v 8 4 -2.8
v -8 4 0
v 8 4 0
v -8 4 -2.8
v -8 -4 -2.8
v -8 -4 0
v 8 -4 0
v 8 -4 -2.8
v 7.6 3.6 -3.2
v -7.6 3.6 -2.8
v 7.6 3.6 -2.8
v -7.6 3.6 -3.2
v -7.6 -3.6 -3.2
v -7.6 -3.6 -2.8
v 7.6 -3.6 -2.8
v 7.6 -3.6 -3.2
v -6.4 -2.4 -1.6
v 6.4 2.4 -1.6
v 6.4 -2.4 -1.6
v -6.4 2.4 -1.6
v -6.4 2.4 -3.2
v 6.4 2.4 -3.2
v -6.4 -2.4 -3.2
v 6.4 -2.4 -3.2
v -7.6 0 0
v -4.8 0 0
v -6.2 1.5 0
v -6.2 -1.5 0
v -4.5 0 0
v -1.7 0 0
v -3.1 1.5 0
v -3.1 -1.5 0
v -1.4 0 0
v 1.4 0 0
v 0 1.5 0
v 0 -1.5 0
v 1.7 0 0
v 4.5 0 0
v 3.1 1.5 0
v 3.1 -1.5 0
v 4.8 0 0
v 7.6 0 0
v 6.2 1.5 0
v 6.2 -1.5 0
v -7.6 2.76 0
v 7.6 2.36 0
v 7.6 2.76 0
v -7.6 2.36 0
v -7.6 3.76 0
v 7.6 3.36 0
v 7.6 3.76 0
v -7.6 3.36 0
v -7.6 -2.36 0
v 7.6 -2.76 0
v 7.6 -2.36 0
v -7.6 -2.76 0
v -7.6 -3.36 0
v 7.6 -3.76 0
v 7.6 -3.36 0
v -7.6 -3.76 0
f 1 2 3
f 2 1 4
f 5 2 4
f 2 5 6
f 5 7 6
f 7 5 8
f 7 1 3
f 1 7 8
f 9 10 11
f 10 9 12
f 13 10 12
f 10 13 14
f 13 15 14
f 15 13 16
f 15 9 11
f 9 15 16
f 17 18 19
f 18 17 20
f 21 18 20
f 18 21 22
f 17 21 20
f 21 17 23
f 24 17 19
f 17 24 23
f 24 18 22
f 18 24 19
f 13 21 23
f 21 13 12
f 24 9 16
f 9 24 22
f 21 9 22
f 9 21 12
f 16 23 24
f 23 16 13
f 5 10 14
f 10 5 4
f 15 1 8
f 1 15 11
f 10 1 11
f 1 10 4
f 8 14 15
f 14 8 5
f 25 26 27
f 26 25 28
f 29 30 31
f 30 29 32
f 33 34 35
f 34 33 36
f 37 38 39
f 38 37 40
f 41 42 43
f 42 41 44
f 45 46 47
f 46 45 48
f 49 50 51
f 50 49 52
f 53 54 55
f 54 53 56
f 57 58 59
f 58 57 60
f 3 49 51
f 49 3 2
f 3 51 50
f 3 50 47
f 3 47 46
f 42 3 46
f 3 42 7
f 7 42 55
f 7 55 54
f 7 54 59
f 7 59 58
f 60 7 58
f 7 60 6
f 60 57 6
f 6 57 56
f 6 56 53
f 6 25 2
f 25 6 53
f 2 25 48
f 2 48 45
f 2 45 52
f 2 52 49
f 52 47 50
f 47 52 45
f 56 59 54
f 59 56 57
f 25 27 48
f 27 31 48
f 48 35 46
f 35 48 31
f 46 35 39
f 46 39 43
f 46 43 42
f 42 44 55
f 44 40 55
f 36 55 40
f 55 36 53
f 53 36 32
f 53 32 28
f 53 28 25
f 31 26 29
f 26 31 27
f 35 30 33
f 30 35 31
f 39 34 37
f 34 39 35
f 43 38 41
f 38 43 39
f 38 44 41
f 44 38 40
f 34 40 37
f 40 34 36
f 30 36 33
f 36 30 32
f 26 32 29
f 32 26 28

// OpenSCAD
// file: ../p/box5.scad
use <../lib.scad>
function ldraw_lib__box5() = [
// 0 Box with 5 Faces and All Edges
// 0 Name: box5.dat
// 0 Author: James Jessiman
// 0 !LDRAW_ORG Primitive UPDATE 2012-01
// 0 !LICENSE Licensed under CC BY 4.0 : see CAreadme.txt
// 
// 0 BFC CERTIFY CCW
  [0,"BFC","CERTIFY"],
  [0,"BFC","CCW"],
// 
// 0 !HISTORY 2002-04-03 [sbliss] Modified for BFC compliance
// 0 !HISTORY 2002-04-25 [PTadmin] Official Update 2002-02
// 0 !HISTORY 2007-06-24 [PTadmin] Header formatted for Contributor Agreement
// 0 !HISTORY 2008-07-01 [PTadmin] Official Update 2008-01
// 0 !HISTORY 2012-02-16 [Philo] Changed to CCW
// 0 !HISTORY 2012-03-30 [PTadmin] Official Update 2012-01
// 
// 
// 2 24 1 1 1 -1 1 1
  [2,24,1,1,1,-1,1,1],
// 2 24 -1 1 1 -1 1 -1
  [2,24,-1,1,1,-1,1,-1],
// 2 24 -1 1 -1 1 1 -1
  [2,24,-1,1,-1,1,1,-1],
// 2 24 1 1 -1 1 1 1
  [2,24,1,1,-1,1,1,1],
// 2 24 1 0 1 -1 0 1
  [2,24,1,0,1,-1,0,1],
// 2 24 -1 0 1 -1 0 -1
  [2,24,-1,0,1,-1,0,-1],
// 2 24 -1 0 -1 1 0 -1
  [2,24,-1,0,-1,1,0,-1],
// 2 24 1 0 -1 1 0 1
  [2,24,1,0,-1,1,0,1],
// 2 24 1 0 1 1 1 1
  [2,24,1,0,1,1,1,1],
// 2 24 -1 0 1 -1 1 1
  [2,24,-1,0,1,-1,1,1],
// 2 24 1 0 -1 1 1 -1
  [2,24,1,0,-1,1,1,-1],
// 2 24 -1 0 -1 -1 1 -1
  [2,24,-1,0,-1,-1,1,-1],
// 4 16 -1 1 1 1 1 1 1 1 -1 -1 1 -1
  [4,16,-1,1,1,1,1,1,1,1,-1,-1,1,-1],
// 4 16 -1 1 1 -1 0 1 1 0 1 1 1 1
  [4,16,-1,1,1,-1,0,1,1,0,1,1,1,1],
// 4 16 -1 1 -1 -1 0 -1 -1 0 1 -1 1 1
  [4,16,-1,1,-1,-1,0,-1,-1,0,1,-1,1,1],
// 4 16 1 1 -1 1 0 -1 -1 0 -1 -1 1 -1
  [4,16,1,1,-1,1,0,-1,-1,0,-1,-1,1,-1],
// 4 16 1 1 1 1 0 1 1 0 -1 1 1 -1
  [4,16,1,1,1,1,0,1,1,0,-1,1,1,-1],
];
module ldraw_lib__box5(step=0, col=false, unit=2/5, alt=false, line=0.2, solid=!$preview)
    makepoly(ldraw_lib__box5(), step=step, col=col, unit=unit, alt=alt, line=line, solid=solid);
ldraw_lib__box5(line=0.2);
// file: ../p/box4.scad
use <../lib.scad>
function ldraw_lib__box4() = [
// 0 Box with 4 Faces (2 Parallel Pairs) and All Edges
// 0 Name: box4.dat
// 0 Author: James Jessiman
// 0 !LDRAW_ORG Primitive UPDATE 2012-01
// 0 !LICENSE Licensed under CC BY 4.0 : see CAreadme.txt
// 
// 0 BFC CERTIFY CCW
  [0,"BFC","CERTIFY"],
  [0,"BFC","CCW"],
// 
// 0 !HISTORY 2002-04-03 [sbliss] Modified for BFC compliance
// 0 !HISTORY 2002-04-25 [PTadmin] Official Update 2002-02
// 0 !HISTORY 2007-06-24 [PTadmin] Header formatted for Contributor Agreement
// 0 !HISTORY 2008-07-01 [PTadmin] Official Update 2008-01
// 0 !HISTORY 2012-02-16 [Philo] Changed to CCW
// 0 !HISTORY 2012-03-30 [PTadmin] Official Update 2012-01
// 
// 
// 2 24 1 1 1 -1 1 1
  [2,24,1,1,1,-1,1,1],
// 2 24 -1 1 1 -1 1 -1
  [2,24,-1,1,1,-1,1,-1],
// 2 24 -1 1 -1 1 1 -1
  [2,24,-1,1,-1,1,1,-1],
// 2 24 1 1 -1 1 1 1
  [2,24,1,1,-1,1,1,1],
// 2 24 1 0 1 -1 0 1
  [2,24,1,0,1,-1,0,1],
// 2 24 -1 0 1 -1 0 -1
  [2,24,-1,0,1,-1,0,-1],
// 2 24 -1 0 -1 1 0 -1
  [2,24,-1,0,-1,1,0,-1],
// 2 24 1 0 -1 1 0 1
  [2,24,1,0,-1,1,0,1],
// 2 24 1 0 1 1 1 1
  [2,24,1,0,1,1,1,1],
// 2 24 -1 0 1 -1 1 1
  [2,24,-1,0,1,-1,1,1],
// 2 24 1 0 -1 1 1 -1
  [2,24,1,0,-1,1,1,-1],
// 2 24 -1 0 -1 -1 1 -1
  [2,24,-1,0,-1,-1,1,-1],
// 4 16 -1 1 1 -1 0 1 1 0 1 1 1 1
  [4,16,-1,1,1,-1,0,1,1,0,1,1,1,1],
// 4 16 -1 1 -1 -1 0 -1 -1 0 1 -1 1 1
  [4,16,-1,1,-1,-1,0,-1,-1,0,1,-1,1,1],
// 4 16 1 1 -1 1 0 -1 -1 0 -1 -1 1 -1
  [4,16,1,1,-1,1,0,-1,-1,0,-1,-1,1,-1],
// 4 16 1 1 1 1 0 1 1 0 -1 1 1 -1
  [4,16,1,1,1,1,0,1,1,0,-1,1,1,-1],
];
module ldraw_lib__box4(step=0, col=false, unit=2/5, alt=false, line=0.2, solid=!$preview)
    makepoly(ldraw_lib__box4(), step=step, col=col, unit=unit, alt=alt, line=line, solid=solid);
ldraw_lib__box4(line=0.2);
// file: s/3069bs01.scad
use <../../lib.scad>
use <../../p/box4.scad>
use <../../p/box5.scad>
function ldraw_lib__s__3069bs01() = [
// 0 ~Tile  1 x  2 with Groove without Top Face
// 0 Name: s\3069bs01.dat
// 0 Author: Santeri Piippo [arezey]
// 0 !LDRAW_ORG Subpart UPDATE 2010-02
// 0 !LICENSE Licensed under CC BY 4.0 : see CAreadme.txt
// 
// 0 BFC CERTIFY CCW
  [0,"BFC","CERTIFY"],
  [0,"BFC","CCW"],
// 
// 0 !HISTORY 2010-07-05 [PTadmin] Official Update 2010-02
// 
// 
// 1 16 0 0 0 20 0 0 0 7 0 0 0 10 box4.dat
  [1,16,0,0,0,20,0,0,0,7,0,0,0,10, ldraw_lib__box4()],
// 1 16 0 7 0 19 0 0 0 1 0 0 0 9 box4.dat
  [1,16,0,7,0,19,0,0,0,1,0,0,0,9, ldraw_lib__box4()],
// 0 BFC INVERTNEXT
  [0,"BFC","INVERTNEXT"],
// 1 16 0 8 0 16 0 0 0 -4 0 0 0 6 box5.dat
  [1,16,0,8,0,16,0,0,0,-4,0,0,0,6, ldraw_lib__box5()],
// 4 16 -19 8 9 -16 8 6 -16 8 -6 -19 8 -9
  [4,16,-19,8,9,-16,8,6,-16,8,-6,-19,8,-9],
// 4 16 19 8 -9 16 8 -6 16 8 6 19 8 9
  [4,16,19,8,-9,16,8,-6,16,8,6,19,8,9],
// 4 16 19 8 9 16 8 6 -16 8 6 -19 8 9
  [4,16,19,8,9,16,8,6,-16,8,6,-19,8,9],
// 4 16 -19 8 -9 -16 8 -6 16 8 -6 19 8 -9
  [4,16,-19,8,-9,-16,8,-6,16,8,-6,19,8,-9],
// 4 16 -20 7 10 -19 7 9 -19 7 -9 -20 7 -10
  [4,16,-20,7,10,-19,7,9,-19,7,-9,-20,7,-10],
// 4 16 20 7 -10 19 7 -9 19 7 9 20 7 10
  [4,16,20,7,-10,19,7,-9,19,7,9,20,7,10],
// 4 16 20 7 10 19 7 9 -19 7 9 -20 7 10
  [4,16,20,7,10,19,7,9,-19,7,9,-20,7,10],
// 4 16 -20 7 -10 -19 7 -9 19 7 -9 20 7 -10
  [4,16,-20,7,-10,-19,7,-9,19,7,-9,20,7,-10],
// 0 //
];
module ldraw_lib__s__3069bs01(step=0, col=false, unit=2/5, alt=false, line=0.2, solid=!$preview)
    makepoly(ldraw_lib__s__3069bs01(), step=step, col=col, unit=unit, alt=alt, line=line, solid=solid);
ldraw_lib__s__3069bs01(line=0.2);
// main file
use <../lib.scad>
use <s/3069bs01.scad>
function ldraw_lib__3069bp0y() = [
// 0 Tile  1 x  2 with Orange, Yellow and Blue Diamonds and Dark Turquoise Lines Pattern
// 0 Name: 3069bp0y.dat
// 0 Author: Vincent Messenet [Cheenzo]
// 0 !LDRAW_ORG Part UPDATE 2025-01
// 0 !LICENSE Licensed under CC BY 4.0 : see CAreadme.txt
// 
// 0 BFC CERTIFY CCW
  [0,"BFC","CERTIFY"],
  [0,"BFC","CCW"],
// 
// 0 !KEYWORDS BrickLink 3069pb1314, Rebrickable 3069bpr9350, Set 10359
// 
// 0 !HISTORY 2025-01-20 [OrionP] Official Update 2025-01
// 
// 1 16 0 0 0 1 0 0 0 1 0 0 0 1 s\3069bs01.dat
  [1,16,0,0,0,1,0,0,0,1,0,0,0,1, ldraw_lib__s__3069bs01()],
// 
// 4 14 -12 0 0 -15.5 0 3.75 -19 0 0 -15.5 0 -3.75
  [4,14,-12,0,0,-15.5,0,3.75,-19,0,0,-15.5,0,-3.75],
// 4 25 -4.25 0 0 -7.75 0 3.75 -11.25 0 0 -7.75 0 -3.75
  [4,25,-4.25,0,0,-7.75,0,3.75,-11.25,0,0,-7.75,0,-3.75],
// 4 1 3.5 0 0 0 0 3.75 -3.5 0 0 0 0 -3.75
  [4,1,3.5,0,0,0,0,3.75,-3.5,0,0,0,0,-3.75],
// 4 14 11.25 0 0 7.75 0 3.75 4.25 0 0 7.75 0 -3.75
  [4,14,11.25,0,0,7.75,0,3.75,4.25,0,0,7.75,0,-3.75],
// 4 25 19 0 0 15.5 0 3.75 12 0 0 15.5 0 -3.75
  [4,25,19,0,0,15.5,0,3.75,12,0,0,15.5,0,-3.75],
// 4 3 -19 0 6.9 -19 0 5.9 19 0 5.9 19 0 6.9
  [4,3,-19,0,6.9,-19,0,5.9,19,0,5.9,19,0,6.9],
// 4 3 -19 0 9.4 -19 0 8.4 19 0 8.4 19 0 9.4
  [4,3,-19,0,9.4,-19,0,8.4,19,0,8.4,19,0,9.4],
// 4 3 19 0 -5.9 -19 0 -5.9 -19 0 -6.9 19 0 -6.9
  [4,3,19,0,-5.9,-19,0,-5.9,-19,0,-6.9,19,0,-6.9],
// 4 3 19 0 -8.4 -19 0 -8.4 -19 0 -9.4 19 0 -9.4
  [4,3,19,0,-8.4,-19,0,-8.4,-19,0,-9.4,19,0,-9.4],
// 4 16 -20 0 10 -19 0 9.4 19 0 9.4 20 0 10
  [4,16,-20,0,10,-19,0,9.4,19,0,9.4,20,0,10],
// 3 16 20 0 10 19 0 9.4 19 0 8.4
  [3,16,20,0,10,19,0,9.4,19,0,8.4],
// 3 16 20 0 10 19 0 8.4 19 0 6.9
  [3,16,20,0,10,19,0,8.4,19,0,6.9],
// 3 16 20 0 10 19 0 6.9 19 0 5.9
  [3,16,20,0,10,19,0,6.9,19,0,5.9],
// 4 16 20 0 -10 20 0 10 19 0 5.9 19 0 0
  [4,16,20,0,-10,20,0,10,19,0,5.9,19,0,0],
// 3 16 20 0 -10 19 0 0 19 0 -5.9
  [3,16,20,0,-10,19,0,0,19,0,-5.9],
// 3 16 20 0 -10 19 0 -5.9 19 0 -6.9
  [3,16,20,0,-10,19,0,-5.9,19,0,-6.9],
// 3 16 20 0 -10 19 0 -6.9 19 0 -8.4
  [3,16,20,0,-10,19,0,-6.9,19,0,-8.4],
// 3 16 20 0 -10 19 0 -8.4 19 0 -9.4
  [3,16,20,0,-10,19,0,-8.4,19,0,-9.4],
// 4 16 20 0 -10 19 0 -9.4 -19 0 -9.4 -20 0 -10
  [4,16,20,0,-10,19,0,-9.4,-19,0,-9.4,-20,0,-10],
// 3 16 -19 0 -9.4 -19 0 -8.4 -20 0 -10
  [3,16,-19,0,-9.4,-19,0,-8.4,-20,0,-10],
// 3 16 -20 0 -10 -19 0 -8.4 -19 0 -6.9
  [3,16,-20,0,-10,-19,0,-8.4,-19,0,-6.9],
// 3 16 -20 0 -10 -19 0 -6.9 -19 0 -5.9
  [3,16,-20,0,-10,-19,0,-6.9,-19,0,-5.9],
// 4 16 -20 0 10 -20 0 -10 -19 0 -5.9 -19 0 0
  [4,16,-20,0,10,-20,0,-10,-19,0,-5.9,-19,0,0],
// 3 16 -20 0 10 -19 0 0 -19 0 5.9
  [3,16,-20,0,10,-19,0,0,-19,0,5.9],
// 3 16 -20 0 10 -19 0 5.9 -19 0 6.9
  [3,16,-20,0,10,-19,0,5.9,-19,0,6.9],
// 3 16 -20 0 10 -19 0 6.9 -19 0 8.4
  [3,16,-20,0,10,-19,0,6.9,-19,0,8.4],
// 3 16 -20 0 10 -19 0 8.4 -19 0 9.4
  [3,16,-20,0,10,-19,0,8.4,-19,0,9.4],
// 4 16 19 0 8.4 -19 0 8.4 -19 0 6.9 19 0 6.9
  [4,16,19,0,8.4,-19,0,8.4,-19,0,6.9,19,0,6.9],
// 4 16 -19 0 -8.4 19 0 -8.4 19 0 -6.9 -19 0 -6.9
  [4,16,-19,0,-8.4,19,0,-8.4,19,0,-6.9,-19,0,-6.9],
// 3 16 -19 0 0 -15.5 0 3.75 -19 0 5.9
  [3,16,-19,0,0,-15.5,0,3.75,-19,0,5.9],
// 3 16 -15.5 0 3.75 -7.75 0 3.75 -19 0 5.9
  [3,16,-15.5,0,3.75,-7.75,0,3.75,-19,0,5.9],
// 4 16 19 0 5.9 -19 0 5.9 -7.75 0 3.75 0 0 3.75
  [4,16,19,0,5.9,-19,0,5.9,-7.75,0,3.75,0,0,3.75],
// 3 16 19 0 5.9 0 0 3.75 7.75 0 3.75
  [3,16,19,0,5.9,0,0,3.75,7.75,0,3.75],
// 3 16 19 0 5.9 7.75 0 3.75 15.5 0 3.75
  [3,16,19,0,5.9,7.75,0,3.75,15.5,0,3.75],
// 3 16 19 0 5.9 15.5 0 3.75 19 0 0
  [3,16,19,0,5.9,15.5,0,3.75,19,0,0],
// 3 16 19 0 0 15.5 0 -3.75 19 0 -5.9
  [3,16,19,0,0,15.5,0,-3.75,19,0,-5.9],
// 3 16 15.5 0 -3.75 7.75 0 -3.75 19 0 -5.9
  [3,16,15.5,0,-3.75,7.75,0,-3.75,19,0,-5.9],
// 4 16 7.75 0 -3.75 0 0 -3.75 -19 0 -5.9 19 0 -5.9
  [4,16,7.75,0,-3.75,0,0,-3.75,-19,0,-5.9,19,0,-5.9],
// 3 16 -19 0 -5.9 0 0 -3.75 -7.75 0 -3.75
  [3,16,-19,0,-5.9,0,0,-3.75,-7.75,0,-3.75],
// 3 16 -19 0 -5.9 -7.75 0 -3.75 -15.5 0 -3.75
  [3,16,-19,0,-5.9,-7.75,0,-3.75,-15.5,0,-3.75],
// 3 16 -19 0 -5.9 -15.5 0 -3.75 -19 0 0
  [3,16,-19,0,-5.9,-15.5,0,-3.75,-19,0,0],
// 4 16 -12 0 0 -11.25 0 0 -7.75 0 3.75 -15.5 0 3.75
  [4,16,-12,0,0,-11.25,0,0,-7.75,0,3.75,-15.5,0,3.75],
// 4 16 -4.25 0 0 -3.5 0 0 0 0 3.75 -7.75 0 3.75
  [4,16,-4.25,0,0,-3.5,0,0,0,0,3.75,-7.75,0,3.75],
// 4 16 4.25 0 0 7.75 0 3.75 0 0 3.75 3.5 0 0
  [4,16,4.25,0,0,7.75,0,3.75,0,0,3.75,3.5,0,0],
// 4 16 11.25 0 0 12 0 0 15.5 0 3.75 7.75 0 3.75
  [4,16,11.25,0,0,12,0,0,15.5,0,3.75,7.75,0,3.75],
// 4 16 7.75 0 -3.75 15.5 0 -3.75 12 0 0 11.25 0 0
  [4,16,7.75,0,-3.75,15.5,0,-3.75,12,0,0,11.25,0,0],
// 4 16 7.75 0 -3.75 4.25 0 0 3.5 0 0 0 0 -3.75
  [4,16,7.75,0,-3.75,4.25,0,0,3.5,0,0,0,0,-3.75],
// 4 16 0 0 -3.75 -3.5 0 0 -4.25 0 0 -7.75 0 -3.75
  [4,16,0,0,-3.75,-3.5,0,0,-4.25,0,0,-7.75,0,-3.75],
// 4 16 -7.75 0 -3.75 -11.25 0 0 -12 0 0 -15.5 0 -3.75
  [4,16,-7.75,0,-3.75,-11.25,0,0,-12,0,0,-15.5,0,-3.75],
];
module ldraw_lib__3069bp0y(step=0, col=false, unit=2/5, alt=false, line=0.2, solid=!$preview)
    makepoly(ldraw_lib__3069bp0y(), step=step, col=col, unit=unit, alt=alt, line=line, solid=solid);
ldraw_lib__3069bp0y(line=0.2);
